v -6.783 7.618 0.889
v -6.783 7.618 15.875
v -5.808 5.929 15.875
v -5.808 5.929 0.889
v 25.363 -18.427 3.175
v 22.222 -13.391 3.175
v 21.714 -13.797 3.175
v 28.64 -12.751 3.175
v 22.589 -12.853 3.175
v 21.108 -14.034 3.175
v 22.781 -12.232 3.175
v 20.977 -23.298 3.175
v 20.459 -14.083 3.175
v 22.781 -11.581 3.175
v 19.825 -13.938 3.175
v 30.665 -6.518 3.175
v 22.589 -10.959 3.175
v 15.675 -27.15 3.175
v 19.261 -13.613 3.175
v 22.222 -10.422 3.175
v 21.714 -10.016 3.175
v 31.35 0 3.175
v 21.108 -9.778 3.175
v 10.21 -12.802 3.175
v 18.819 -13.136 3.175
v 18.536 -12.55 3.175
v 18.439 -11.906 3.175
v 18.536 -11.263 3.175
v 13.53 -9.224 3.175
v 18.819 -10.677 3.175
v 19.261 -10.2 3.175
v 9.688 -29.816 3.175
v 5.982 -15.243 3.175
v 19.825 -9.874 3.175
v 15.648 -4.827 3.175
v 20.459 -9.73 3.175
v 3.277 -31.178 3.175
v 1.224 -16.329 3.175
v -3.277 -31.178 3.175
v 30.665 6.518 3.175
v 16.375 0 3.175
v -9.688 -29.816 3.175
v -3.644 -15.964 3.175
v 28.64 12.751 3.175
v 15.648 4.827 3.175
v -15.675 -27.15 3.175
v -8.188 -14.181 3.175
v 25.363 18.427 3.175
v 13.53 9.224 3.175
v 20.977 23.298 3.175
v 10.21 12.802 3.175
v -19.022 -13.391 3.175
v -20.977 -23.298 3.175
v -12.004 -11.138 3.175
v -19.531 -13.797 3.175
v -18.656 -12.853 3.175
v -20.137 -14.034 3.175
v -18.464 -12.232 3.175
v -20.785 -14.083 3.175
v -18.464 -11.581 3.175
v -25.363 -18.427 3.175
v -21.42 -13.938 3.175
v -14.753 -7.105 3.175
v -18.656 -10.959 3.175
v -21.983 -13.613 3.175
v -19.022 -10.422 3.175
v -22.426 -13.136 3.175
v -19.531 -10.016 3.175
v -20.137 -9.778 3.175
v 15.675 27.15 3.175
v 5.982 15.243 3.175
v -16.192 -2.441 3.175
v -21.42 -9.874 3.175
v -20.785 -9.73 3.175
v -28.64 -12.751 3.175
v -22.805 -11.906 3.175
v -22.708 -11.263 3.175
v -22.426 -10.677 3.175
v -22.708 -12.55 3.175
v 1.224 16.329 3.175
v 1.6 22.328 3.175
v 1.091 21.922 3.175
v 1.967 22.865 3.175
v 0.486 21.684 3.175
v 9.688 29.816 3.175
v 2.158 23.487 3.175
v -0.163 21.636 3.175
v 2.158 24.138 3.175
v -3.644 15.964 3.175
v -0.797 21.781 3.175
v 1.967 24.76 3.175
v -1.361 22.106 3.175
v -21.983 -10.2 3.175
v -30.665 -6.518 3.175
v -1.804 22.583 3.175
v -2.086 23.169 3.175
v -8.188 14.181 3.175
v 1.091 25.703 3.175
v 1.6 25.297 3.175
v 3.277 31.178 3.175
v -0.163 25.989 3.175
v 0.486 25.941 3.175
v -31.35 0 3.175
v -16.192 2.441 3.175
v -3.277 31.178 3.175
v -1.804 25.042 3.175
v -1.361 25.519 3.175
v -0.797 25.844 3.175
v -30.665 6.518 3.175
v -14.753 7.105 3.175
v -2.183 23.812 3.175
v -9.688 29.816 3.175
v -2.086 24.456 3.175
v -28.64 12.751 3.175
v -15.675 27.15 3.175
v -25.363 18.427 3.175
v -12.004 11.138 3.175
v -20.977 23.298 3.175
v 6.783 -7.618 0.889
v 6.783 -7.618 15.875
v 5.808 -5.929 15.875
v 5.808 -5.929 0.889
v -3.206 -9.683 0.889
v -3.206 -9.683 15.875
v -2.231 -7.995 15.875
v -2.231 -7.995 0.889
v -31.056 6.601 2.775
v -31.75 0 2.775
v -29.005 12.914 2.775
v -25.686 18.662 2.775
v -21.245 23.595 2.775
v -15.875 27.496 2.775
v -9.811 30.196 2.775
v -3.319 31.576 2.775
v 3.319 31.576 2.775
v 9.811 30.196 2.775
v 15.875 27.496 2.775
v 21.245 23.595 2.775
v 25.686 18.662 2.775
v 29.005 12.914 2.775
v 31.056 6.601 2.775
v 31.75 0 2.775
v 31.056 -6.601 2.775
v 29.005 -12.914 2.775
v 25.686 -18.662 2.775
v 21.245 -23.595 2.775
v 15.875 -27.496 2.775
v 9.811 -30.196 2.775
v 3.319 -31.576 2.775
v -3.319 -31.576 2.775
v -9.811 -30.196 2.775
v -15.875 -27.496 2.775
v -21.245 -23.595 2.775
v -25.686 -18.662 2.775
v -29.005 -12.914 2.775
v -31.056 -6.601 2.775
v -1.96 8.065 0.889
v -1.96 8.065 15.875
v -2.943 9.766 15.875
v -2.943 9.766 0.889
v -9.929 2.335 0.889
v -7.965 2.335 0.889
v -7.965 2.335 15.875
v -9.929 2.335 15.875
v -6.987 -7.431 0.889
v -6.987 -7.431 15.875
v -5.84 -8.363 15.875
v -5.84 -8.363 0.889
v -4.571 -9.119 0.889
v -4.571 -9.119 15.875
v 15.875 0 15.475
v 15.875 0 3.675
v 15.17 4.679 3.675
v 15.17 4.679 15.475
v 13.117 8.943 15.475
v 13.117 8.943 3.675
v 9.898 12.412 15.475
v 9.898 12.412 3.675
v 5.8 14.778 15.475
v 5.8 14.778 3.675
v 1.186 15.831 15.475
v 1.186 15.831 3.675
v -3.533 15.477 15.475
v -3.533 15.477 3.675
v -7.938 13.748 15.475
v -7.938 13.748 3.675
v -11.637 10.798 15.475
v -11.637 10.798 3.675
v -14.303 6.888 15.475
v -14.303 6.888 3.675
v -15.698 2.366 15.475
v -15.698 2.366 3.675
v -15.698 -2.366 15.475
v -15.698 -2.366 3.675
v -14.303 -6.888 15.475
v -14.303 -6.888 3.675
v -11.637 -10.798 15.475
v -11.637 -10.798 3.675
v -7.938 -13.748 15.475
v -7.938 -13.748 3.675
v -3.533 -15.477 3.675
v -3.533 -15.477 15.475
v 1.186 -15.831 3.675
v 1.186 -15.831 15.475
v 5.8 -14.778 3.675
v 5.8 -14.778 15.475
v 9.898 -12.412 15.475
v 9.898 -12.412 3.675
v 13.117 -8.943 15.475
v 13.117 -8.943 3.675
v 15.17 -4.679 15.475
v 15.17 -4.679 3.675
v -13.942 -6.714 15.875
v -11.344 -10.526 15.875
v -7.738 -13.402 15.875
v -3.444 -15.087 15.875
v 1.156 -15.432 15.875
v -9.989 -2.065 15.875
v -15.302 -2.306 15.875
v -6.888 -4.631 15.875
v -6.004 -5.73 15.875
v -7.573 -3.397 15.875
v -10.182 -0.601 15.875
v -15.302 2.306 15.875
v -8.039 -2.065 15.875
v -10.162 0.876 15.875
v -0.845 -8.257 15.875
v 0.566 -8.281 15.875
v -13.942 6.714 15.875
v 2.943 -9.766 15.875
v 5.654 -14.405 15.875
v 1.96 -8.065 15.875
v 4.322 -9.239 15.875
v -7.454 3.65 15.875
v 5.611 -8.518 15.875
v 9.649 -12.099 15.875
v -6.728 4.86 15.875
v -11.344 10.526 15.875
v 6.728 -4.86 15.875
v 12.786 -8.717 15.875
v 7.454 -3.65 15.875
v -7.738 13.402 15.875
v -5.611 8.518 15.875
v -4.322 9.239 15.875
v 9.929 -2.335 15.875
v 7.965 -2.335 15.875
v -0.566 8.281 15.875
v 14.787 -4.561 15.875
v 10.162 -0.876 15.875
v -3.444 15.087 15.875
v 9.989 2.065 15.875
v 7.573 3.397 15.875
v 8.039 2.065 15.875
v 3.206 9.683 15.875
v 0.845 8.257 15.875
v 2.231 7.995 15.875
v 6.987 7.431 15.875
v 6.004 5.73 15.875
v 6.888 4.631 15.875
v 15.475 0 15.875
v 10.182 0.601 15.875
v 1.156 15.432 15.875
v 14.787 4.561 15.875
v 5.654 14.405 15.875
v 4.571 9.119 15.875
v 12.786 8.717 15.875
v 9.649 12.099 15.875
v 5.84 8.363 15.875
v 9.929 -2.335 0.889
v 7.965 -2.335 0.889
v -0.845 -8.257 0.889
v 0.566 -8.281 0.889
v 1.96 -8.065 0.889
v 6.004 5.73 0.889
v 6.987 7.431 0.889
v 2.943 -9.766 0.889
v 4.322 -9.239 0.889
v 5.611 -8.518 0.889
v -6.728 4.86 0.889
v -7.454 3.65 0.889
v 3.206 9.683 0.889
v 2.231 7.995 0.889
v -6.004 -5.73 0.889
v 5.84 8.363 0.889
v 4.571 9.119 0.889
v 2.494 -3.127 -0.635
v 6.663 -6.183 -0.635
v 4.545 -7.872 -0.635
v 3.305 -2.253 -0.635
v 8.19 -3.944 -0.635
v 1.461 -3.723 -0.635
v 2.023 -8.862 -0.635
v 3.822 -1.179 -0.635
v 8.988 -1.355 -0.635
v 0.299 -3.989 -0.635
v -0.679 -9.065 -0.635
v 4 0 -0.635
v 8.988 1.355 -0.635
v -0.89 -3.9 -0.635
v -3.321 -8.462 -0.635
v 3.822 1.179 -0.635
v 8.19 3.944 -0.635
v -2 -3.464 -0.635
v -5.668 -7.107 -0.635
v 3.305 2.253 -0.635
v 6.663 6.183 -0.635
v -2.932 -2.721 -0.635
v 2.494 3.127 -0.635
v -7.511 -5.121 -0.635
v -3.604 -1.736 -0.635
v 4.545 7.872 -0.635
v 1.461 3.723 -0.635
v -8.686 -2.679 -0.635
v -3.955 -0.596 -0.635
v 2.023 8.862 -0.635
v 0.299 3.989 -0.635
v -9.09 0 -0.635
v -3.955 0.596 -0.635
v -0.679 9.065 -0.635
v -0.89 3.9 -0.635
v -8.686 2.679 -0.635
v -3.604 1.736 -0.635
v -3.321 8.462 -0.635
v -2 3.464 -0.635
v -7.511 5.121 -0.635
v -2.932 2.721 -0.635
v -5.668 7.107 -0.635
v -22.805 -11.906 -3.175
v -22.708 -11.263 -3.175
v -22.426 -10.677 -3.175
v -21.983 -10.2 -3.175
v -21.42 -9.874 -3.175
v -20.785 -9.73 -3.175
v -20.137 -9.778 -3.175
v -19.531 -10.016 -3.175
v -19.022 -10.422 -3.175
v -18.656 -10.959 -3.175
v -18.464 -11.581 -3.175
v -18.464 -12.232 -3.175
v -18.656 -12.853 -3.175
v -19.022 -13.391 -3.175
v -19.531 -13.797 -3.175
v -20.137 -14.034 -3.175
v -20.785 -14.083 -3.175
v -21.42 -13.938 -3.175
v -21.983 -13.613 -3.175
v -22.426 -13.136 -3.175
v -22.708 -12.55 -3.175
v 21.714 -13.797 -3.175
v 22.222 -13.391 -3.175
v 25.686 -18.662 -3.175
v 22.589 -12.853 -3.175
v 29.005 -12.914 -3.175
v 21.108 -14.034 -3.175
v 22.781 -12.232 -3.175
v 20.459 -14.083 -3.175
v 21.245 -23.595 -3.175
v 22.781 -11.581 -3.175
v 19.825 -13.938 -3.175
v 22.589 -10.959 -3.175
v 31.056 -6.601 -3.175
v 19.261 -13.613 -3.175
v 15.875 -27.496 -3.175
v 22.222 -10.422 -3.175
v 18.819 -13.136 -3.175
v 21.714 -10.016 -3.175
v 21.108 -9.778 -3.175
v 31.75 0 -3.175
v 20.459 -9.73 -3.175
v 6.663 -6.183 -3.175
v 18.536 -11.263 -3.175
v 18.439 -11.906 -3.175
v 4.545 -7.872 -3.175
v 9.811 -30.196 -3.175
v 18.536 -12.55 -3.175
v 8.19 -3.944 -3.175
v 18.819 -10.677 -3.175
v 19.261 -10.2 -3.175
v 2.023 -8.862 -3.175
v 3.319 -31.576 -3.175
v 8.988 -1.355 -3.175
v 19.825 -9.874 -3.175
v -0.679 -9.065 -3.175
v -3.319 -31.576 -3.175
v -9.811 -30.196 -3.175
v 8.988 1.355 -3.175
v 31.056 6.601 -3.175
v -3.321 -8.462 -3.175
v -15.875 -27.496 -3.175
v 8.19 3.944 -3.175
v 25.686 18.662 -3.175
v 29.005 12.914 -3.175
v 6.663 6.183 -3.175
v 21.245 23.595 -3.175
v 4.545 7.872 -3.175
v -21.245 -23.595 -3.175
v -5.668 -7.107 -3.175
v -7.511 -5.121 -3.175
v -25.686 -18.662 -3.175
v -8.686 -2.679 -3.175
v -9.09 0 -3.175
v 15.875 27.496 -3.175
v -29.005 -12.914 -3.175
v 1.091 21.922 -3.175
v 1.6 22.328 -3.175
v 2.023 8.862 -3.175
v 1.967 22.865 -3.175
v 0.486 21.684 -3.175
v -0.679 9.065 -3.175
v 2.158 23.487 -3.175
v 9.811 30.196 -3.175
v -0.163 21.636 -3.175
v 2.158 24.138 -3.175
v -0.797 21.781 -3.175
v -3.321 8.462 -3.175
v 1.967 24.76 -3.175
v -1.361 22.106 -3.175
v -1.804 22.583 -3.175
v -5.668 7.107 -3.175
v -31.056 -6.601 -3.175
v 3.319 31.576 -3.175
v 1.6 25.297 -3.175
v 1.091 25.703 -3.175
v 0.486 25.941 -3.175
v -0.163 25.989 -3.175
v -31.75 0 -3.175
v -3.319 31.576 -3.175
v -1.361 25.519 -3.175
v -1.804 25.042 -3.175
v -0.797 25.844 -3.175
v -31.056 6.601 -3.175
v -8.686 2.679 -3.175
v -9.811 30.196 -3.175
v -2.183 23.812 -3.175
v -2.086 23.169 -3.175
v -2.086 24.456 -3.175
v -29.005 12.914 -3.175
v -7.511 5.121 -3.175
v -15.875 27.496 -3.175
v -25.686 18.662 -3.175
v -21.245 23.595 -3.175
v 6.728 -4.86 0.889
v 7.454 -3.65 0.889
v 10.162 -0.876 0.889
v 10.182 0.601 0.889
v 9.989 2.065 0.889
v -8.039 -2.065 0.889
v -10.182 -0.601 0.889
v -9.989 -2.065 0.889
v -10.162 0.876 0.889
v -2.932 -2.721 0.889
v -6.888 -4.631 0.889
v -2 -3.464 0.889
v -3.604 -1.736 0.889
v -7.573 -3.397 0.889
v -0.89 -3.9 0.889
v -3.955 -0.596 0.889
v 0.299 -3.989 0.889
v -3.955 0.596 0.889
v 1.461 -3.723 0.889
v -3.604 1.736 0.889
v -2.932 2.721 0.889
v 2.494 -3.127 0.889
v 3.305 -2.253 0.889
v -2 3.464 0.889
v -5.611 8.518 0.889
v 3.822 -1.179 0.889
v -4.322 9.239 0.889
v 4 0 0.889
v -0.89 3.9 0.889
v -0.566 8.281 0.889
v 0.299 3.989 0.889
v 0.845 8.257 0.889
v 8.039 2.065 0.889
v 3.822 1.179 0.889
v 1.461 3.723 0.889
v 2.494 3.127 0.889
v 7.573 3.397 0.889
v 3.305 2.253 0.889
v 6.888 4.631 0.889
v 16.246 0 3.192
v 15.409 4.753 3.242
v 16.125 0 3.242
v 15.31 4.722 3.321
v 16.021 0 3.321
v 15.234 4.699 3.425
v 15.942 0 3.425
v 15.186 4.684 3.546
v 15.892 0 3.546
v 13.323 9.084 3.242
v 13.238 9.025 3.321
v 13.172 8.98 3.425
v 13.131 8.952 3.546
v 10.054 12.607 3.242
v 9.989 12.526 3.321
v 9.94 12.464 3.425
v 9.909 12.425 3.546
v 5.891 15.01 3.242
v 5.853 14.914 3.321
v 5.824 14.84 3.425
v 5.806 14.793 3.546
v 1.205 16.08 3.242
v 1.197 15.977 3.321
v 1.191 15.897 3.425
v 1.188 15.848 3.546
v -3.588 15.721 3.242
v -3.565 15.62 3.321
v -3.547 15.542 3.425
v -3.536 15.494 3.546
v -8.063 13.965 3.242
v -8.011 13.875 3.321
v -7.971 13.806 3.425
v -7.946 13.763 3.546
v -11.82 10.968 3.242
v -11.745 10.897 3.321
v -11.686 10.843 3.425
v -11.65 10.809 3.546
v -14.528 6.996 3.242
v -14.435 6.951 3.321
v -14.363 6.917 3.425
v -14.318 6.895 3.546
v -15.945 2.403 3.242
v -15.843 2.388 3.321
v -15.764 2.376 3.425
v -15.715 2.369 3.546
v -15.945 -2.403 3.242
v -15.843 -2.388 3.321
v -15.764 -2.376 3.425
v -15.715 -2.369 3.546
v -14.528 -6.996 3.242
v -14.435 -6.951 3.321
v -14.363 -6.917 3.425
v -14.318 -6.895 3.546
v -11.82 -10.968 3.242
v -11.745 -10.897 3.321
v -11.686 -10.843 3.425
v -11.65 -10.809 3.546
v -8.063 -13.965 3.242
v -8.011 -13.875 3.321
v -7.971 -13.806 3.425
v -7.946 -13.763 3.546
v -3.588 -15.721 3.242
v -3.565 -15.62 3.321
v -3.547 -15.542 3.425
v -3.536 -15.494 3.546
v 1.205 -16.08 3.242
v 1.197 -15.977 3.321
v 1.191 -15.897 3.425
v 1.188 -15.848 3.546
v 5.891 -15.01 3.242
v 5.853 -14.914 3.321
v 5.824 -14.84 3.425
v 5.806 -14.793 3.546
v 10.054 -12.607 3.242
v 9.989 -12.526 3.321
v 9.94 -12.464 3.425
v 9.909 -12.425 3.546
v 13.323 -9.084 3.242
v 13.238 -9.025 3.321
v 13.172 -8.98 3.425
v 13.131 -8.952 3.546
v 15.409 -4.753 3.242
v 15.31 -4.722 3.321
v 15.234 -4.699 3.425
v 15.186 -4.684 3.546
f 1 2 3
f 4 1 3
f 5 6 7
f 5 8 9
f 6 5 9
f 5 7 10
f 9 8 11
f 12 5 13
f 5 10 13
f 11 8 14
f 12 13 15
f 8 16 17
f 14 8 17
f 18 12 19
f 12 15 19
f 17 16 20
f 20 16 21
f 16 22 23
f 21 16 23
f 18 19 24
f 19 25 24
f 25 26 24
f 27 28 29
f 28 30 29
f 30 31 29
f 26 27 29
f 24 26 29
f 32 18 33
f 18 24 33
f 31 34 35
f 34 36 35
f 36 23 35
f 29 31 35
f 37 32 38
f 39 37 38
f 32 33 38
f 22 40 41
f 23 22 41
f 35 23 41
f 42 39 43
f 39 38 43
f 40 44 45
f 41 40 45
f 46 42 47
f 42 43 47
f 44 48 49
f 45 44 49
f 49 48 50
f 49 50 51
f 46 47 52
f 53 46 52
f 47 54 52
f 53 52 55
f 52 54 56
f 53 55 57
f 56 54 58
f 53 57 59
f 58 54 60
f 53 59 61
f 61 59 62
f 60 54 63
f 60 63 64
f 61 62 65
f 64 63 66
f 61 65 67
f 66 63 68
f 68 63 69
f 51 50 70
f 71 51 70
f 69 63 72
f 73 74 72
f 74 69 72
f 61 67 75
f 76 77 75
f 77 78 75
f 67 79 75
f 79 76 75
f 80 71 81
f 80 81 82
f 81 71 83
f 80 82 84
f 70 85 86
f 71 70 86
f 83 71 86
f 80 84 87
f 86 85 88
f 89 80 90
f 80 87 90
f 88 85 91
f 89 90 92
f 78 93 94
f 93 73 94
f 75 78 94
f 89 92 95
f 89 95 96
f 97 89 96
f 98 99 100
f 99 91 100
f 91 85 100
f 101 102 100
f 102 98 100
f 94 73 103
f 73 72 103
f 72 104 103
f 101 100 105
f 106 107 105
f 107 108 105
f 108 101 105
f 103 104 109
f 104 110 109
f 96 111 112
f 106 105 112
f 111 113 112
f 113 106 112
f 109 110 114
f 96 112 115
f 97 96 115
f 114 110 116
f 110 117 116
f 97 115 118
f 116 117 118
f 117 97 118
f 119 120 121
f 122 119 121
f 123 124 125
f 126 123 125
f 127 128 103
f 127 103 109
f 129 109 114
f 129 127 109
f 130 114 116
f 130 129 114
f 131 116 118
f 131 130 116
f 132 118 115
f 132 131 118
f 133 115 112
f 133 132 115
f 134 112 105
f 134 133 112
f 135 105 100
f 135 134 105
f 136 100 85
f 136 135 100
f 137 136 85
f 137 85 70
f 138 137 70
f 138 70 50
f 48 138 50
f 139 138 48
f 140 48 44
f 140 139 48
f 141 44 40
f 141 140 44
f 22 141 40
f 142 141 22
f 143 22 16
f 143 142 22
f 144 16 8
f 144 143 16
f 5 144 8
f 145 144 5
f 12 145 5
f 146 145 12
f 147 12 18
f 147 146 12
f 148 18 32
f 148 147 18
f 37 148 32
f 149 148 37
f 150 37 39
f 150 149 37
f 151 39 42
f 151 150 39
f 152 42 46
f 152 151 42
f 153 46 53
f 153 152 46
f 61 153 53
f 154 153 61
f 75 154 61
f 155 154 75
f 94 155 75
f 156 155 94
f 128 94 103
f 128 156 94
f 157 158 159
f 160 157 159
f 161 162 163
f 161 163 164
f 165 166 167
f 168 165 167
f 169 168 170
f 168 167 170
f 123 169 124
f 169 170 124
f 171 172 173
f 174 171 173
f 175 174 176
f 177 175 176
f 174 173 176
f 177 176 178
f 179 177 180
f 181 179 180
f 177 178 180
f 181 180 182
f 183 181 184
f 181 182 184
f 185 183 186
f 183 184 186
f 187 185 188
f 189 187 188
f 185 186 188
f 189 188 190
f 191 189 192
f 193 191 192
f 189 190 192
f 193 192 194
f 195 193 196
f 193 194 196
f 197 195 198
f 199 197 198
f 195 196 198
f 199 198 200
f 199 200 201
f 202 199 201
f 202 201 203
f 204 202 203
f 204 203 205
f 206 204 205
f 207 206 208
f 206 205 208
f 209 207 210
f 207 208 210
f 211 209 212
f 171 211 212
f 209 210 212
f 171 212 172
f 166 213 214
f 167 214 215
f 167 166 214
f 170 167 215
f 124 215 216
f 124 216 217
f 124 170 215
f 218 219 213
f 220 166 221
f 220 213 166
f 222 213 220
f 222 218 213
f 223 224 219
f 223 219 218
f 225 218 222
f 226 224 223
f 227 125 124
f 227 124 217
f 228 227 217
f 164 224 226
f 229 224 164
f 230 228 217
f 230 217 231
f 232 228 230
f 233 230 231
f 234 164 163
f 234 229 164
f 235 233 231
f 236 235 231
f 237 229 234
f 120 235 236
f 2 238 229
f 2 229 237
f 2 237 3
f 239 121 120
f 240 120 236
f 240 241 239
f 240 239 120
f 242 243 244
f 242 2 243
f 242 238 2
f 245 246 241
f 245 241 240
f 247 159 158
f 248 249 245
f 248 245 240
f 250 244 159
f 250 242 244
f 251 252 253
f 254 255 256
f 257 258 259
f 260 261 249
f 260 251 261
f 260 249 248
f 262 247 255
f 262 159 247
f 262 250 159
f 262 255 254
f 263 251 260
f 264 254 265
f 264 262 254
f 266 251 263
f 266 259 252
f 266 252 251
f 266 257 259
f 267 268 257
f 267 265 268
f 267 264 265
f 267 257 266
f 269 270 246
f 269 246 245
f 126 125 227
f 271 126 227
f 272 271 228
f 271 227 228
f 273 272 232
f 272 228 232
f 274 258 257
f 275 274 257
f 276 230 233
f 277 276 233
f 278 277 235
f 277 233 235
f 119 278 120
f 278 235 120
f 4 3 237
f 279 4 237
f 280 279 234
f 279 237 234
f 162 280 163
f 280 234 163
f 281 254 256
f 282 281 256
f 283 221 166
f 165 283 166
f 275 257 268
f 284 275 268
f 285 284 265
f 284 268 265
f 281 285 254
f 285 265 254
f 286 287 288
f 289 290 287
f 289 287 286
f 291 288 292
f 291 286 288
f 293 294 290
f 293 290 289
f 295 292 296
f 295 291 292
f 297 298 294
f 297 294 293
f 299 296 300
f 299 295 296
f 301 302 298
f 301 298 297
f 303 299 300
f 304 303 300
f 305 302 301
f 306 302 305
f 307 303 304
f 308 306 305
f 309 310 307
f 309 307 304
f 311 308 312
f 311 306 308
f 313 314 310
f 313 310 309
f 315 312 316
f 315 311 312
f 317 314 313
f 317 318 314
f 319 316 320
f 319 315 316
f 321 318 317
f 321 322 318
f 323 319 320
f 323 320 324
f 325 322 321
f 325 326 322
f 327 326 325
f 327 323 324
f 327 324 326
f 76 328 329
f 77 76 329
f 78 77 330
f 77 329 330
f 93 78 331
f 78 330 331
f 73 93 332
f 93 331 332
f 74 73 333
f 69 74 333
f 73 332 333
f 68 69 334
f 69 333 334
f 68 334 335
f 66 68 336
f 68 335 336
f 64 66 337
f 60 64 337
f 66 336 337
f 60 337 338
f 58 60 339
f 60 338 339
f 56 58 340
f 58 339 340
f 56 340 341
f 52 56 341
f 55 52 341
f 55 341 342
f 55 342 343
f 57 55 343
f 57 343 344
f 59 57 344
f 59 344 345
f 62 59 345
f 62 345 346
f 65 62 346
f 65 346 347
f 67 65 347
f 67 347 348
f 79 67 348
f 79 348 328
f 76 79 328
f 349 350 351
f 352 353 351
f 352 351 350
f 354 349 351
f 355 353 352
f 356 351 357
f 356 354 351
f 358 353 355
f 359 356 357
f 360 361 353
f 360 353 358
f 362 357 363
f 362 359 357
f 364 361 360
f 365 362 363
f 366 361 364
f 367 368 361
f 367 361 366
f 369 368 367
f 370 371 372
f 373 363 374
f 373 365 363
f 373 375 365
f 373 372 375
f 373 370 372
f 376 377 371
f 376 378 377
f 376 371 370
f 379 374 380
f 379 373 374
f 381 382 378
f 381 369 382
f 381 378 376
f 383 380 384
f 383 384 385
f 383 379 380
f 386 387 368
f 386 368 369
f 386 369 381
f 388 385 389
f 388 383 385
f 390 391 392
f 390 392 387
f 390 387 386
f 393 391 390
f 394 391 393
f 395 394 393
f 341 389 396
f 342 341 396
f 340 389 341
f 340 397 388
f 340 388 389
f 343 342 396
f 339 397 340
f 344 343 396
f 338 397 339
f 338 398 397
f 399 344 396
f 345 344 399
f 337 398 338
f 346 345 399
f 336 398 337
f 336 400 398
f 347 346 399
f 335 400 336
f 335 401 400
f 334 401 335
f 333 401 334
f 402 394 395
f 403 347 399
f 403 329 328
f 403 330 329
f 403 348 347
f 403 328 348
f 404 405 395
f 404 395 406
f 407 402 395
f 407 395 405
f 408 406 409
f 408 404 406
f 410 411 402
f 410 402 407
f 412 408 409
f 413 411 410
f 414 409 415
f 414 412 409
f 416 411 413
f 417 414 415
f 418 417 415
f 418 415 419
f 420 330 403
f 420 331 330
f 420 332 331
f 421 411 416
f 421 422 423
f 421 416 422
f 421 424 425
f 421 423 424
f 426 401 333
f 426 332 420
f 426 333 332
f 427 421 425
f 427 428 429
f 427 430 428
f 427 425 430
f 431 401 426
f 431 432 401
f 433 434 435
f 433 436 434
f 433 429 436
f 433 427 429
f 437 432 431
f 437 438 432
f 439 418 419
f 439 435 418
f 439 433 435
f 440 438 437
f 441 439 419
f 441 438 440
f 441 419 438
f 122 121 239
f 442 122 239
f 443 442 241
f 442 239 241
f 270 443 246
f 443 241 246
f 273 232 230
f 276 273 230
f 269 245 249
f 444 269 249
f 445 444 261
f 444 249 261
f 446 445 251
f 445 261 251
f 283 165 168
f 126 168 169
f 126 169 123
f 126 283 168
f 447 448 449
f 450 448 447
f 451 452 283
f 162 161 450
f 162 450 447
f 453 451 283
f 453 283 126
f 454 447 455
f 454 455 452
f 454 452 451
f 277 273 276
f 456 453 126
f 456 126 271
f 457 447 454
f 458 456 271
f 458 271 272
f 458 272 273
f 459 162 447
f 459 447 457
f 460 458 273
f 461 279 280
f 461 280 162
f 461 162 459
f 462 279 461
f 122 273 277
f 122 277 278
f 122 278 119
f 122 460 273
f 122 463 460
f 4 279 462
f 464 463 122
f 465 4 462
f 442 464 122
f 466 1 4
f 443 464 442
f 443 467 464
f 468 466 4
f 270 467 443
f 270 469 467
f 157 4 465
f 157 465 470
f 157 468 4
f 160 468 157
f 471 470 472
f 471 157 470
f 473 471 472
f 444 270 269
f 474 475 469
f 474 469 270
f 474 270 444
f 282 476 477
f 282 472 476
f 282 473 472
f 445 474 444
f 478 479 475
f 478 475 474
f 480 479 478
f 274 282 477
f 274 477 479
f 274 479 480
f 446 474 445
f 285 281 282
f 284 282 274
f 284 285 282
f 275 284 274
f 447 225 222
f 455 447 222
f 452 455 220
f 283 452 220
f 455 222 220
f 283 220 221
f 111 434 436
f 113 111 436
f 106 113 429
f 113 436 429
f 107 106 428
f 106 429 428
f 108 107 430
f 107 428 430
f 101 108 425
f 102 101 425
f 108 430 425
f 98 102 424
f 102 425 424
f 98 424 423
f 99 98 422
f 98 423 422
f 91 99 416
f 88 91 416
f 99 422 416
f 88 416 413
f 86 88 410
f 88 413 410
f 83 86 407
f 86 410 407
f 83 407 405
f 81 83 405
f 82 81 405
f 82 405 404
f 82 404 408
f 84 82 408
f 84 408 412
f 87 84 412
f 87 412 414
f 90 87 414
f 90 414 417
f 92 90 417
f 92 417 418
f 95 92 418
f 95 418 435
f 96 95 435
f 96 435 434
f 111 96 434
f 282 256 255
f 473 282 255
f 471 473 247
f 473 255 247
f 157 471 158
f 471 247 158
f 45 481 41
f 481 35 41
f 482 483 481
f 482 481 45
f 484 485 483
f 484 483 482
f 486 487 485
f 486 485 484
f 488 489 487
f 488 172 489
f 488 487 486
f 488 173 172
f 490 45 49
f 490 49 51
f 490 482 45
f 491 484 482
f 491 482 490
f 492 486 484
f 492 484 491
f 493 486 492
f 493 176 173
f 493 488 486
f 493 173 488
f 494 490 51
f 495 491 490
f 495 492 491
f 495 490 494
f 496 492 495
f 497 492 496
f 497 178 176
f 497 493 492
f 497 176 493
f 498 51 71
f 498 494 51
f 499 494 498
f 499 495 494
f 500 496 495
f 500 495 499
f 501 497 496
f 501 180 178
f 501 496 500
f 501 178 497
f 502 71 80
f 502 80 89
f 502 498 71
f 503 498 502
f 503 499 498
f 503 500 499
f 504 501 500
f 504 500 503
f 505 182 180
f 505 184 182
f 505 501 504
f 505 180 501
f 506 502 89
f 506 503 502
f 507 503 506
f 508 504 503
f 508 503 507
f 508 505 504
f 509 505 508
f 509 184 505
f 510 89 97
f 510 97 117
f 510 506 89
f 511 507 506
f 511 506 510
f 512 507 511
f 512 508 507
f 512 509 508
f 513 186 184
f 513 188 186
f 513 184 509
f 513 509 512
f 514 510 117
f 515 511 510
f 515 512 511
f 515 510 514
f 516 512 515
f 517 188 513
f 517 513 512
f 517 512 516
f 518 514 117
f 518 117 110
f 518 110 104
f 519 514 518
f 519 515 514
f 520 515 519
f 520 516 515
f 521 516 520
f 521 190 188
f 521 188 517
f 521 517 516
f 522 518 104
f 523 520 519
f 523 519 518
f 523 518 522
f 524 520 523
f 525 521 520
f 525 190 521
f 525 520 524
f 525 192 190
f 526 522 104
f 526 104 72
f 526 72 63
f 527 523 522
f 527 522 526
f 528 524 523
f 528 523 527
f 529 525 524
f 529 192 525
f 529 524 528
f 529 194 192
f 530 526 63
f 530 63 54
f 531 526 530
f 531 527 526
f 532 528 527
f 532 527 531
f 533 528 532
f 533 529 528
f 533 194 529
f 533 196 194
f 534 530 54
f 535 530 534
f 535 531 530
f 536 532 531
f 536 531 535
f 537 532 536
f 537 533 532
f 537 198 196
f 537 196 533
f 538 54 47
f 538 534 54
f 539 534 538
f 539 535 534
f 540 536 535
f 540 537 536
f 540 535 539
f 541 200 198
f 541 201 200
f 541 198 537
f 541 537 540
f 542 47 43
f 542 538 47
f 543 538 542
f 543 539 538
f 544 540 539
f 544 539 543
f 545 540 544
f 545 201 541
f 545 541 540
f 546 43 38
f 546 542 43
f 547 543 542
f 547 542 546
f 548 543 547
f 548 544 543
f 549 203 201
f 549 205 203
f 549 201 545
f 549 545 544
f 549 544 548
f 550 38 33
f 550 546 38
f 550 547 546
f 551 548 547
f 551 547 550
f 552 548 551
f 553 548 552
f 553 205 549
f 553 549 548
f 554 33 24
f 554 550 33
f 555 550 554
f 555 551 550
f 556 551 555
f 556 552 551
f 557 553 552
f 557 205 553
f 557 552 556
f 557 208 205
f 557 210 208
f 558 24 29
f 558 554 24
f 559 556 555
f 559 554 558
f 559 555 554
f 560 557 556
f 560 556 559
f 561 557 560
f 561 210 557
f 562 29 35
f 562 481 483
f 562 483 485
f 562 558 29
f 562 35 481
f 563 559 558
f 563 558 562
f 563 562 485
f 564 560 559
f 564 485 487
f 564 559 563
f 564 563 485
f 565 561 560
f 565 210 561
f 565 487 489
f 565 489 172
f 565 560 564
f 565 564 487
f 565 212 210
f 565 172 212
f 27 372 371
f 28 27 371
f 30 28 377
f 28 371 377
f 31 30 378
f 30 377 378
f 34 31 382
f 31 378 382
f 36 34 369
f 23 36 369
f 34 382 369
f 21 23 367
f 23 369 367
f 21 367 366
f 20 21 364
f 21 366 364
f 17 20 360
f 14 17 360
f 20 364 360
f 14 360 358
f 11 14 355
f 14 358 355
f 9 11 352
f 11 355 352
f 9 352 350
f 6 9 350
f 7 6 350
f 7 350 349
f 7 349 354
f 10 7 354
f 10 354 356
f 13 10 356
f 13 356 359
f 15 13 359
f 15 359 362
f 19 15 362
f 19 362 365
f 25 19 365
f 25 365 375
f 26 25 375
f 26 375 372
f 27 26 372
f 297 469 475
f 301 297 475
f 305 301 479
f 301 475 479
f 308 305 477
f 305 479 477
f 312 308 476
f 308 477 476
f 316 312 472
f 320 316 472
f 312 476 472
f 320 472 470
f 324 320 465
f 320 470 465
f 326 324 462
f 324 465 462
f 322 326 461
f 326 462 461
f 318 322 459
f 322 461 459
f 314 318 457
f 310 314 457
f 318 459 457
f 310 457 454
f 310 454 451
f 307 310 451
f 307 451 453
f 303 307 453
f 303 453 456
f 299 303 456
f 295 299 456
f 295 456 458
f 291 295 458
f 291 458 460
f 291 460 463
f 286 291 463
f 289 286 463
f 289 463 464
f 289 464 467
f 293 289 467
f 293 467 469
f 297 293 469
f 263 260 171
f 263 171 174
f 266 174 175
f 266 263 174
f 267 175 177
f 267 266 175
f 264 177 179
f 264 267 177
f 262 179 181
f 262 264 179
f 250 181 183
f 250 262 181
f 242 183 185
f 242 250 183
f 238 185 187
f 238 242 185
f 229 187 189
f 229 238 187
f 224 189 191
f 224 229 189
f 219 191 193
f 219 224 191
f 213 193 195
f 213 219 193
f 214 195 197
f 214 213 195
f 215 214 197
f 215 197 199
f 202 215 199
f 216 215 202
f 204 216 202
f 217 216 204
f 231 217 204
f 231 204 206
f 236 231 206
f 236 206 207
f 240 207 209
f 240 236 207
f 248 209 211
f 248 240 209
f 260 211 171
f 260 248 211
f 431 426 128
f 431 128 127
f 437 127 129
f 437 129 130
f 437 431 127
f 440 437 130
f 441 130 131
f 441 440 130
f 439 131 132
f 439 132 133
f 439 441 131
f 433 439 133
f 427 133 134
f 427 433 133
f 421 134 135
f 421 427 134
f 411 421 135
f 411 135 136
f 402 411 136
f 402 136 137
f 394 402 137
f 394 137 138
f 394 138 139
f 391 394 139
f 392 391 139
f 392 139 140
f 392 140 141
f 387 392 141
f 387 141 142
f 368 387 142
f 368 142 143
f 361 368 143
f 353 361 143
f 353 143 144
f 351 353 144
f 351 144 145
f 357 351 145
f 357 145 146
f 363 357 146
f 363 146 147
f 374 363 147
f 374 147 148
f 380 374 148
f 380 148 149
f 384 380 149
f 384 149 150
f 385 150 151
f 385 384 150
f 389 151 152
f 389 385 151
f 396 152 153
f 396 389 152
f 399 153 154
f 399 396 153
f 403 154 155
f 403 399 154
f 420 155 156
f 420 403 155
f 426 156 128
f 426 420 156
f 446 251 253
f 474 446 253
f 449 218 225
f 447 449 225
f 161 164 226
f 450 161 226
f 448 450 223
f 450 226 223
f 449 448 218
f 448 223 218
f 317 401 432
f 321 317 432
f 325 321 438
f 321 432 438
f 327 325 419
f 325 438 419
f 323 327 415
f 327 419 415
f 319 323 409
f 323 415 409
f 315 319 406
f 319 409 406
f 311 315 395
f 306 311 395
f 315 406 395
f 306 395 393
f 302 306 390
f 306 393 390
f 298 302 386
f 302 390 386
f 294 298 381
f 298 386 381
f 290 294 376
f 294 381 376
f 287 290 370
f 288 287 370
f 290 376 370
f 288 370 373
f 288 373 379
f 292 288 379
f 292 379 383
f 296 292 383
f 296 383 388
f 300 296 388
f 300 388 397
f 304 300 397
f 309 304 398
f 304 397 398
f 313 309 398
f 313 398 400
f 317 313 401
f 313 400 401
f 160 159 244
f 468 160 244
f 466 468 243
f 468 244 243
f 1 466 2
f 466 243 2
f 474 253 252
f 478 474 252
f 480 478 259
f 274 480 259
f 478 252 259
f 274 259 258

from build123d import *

# Parameters (mm, degrees)
SKETCH1_W           = 38.1
SKETCH1_H           = 6.35
SKETCH2_R           = 15.875
BOSS_EXTRUDE1_DEPTH = 12.7
CUT_EXTRUDE1_DEPTH  = 14.986
SKETCH10_R          = 4
CUT_EXTRUDE3_DEPTH  = 10
FILLET2_R           = 0.5
SKETCH12_R          = 38.1
SKETCH12_R_2        = 31.75
SKETCH12_R_3        = 2.1828
CUT_EXTRUDE8_DEPTH  = 10
CHAMFER1_SIZE       = 0.4
SKETCH13_R          = 9.09
CUT_EXTRUDE9_DEPTH  = 2.54
CUT_EXTRUDE10_DEPTH = 14.986


with BuildPart() as part:
    # Sketch1 → Revolve1 (revolve)
    with BuildSketch(Plane(origin=(0, 0, 0), x_dir=(1, 0, 0), z_dir=(0, 1, 0))):
        with Locations((19.05, 0)):
            Rectangle(SKETCH1_W, SKETCH1_H)
    revolve(axis=Axis((0, 0, -3.175), (0, 0, 1)))

    # Sketch2 → Boss-Extrude1 (add)
    with BuildSketch(Plane.XY.offset(3.175)):
        Circle(SKETCH2_R)
    extrude(amount=BOSS_EXTRUDE1_DEPTH)

    # Sketch3 → Cut-Extrude1 (cut)
    with BuildSketch(Plane.XY.offset(15.875)):
        with BuildLine():
            Line((-7.813605563, 2.134846154), (-9.769464259, 2.134846154))
            ThreePointArc((-9.769464259, 2.134846154), (-9.999052891, 0.137627323), (-9.824520402, -1.865153846))
            Line((-9.824520402, -1.865153846), (-7.882334751, -1.865153846))
            ThreePointArc((-7.882334751, -1.865153846), (-7.083348537, -3.928889601), (-5.755633784, -5.699357836))
            Line((-5.755633784, -5.699357836), (-6.733563132, -7.393181152))
            ThreePointArc((-6.733563132, -7.393181152), (-5.118715203, -8.590620156), (-3.296989588, -9.440861171))
            Line((-3.296989588, -9.440861171), (-2.325896763, -7.758879059))
            ThreePointArc((-2.325896763, -7.758879059), (-0.139156065, -8.098804578), (2.057971779, -7.83420399))
            Line((2.057971779, -7.83420399), (3.035901127, -9.528027306))
            ThreePointArc((3.035901127, -9.528027306), (4.880337688, -8.728247479), (6.527530814, -7.575707325))
            Line((6.527530814, -7.575707325), (5.556437988, -5.893725213))
            ThreePointArc((5.556437988, -5.893725213), (6.944192472, -4.169914977), (7.813605563, -2.134846154))
            Line((7.813605563, -2.134846154), (9.769464259, -2.134846154))
            ThreePointArc((9.769464259, -2.134846154), (9.999052891, -0.137627323), (9.824520402, 1.865153846))
            Line((9.824520402, 1.865153846), (7.882334751, 1.865153846))
            ThreePointArc((7.882334751, 1.865153846), (7.083348537, 3.928889601), (5.755633784, 5.699357836))
            Line((5.755633784, 5.699357836), (6.733563132, 7.393181152))
            ThreePointArc((6.733563132, 7.393181152), (5.118715203, 8.590620156), (3.296989588, 9.440861171))
            Line((3.296989588, 9.440861171), (2.325896763, 7.758879059))
            ThreePointArc((2.325896763, 7.758879059), (0.139156065, 8.098804578), (-2.057971779, 7.83420399))
            Line((-2.057971779, 7.83420399), (-3.035901127, 9.528027306))
            ThreePointArc((-3.035901127, 9.528027306), (-4.880337688, 8.728247479), (-6.527530814, 7.575707325))
            Line((-6.527530814, 7.575707325), (-5.556437988, 5.893725213))
            ThreePointArc((-5.556437988, 5.893725213), (-6.944192472, 4.169914977), (-7.813605563, 2.134846154))
        make_face()
    extrude(amount=-CUT_EXTRUDE1_DEPTH, mode=Mode.SUBTRACT)

    # Sketch10 → Cut-Extrude3 (cut)
    with BuildSketch(Plane.XY.offset(0.889)):
        Circle(SKETCH10_R)
    extrude(amount=-CUT_EXTRUDE3_DEPTH, mode=Mode.SUBTRACT)

    # Fillet2
    fillet2_edges = [part.edges().sort_by_distance(p)[0] for p in [
        (-15.875, 0, 3.175),
    ]]
    fillet(fillet2_edges, radius=FILLET2_R)

    # Sketch12 → Cut-Extrude8 (cut)
    # profile 1 of 4: a face of its own
    with BuildSketch(Plane(origin=(0, 0, -3.175), x_dir=(-1, 0, 0), z_dir=(0, 0, -1))):
        Circle(SKETCH12_R)
        Circle(SKETCH12_R_2, mode=Mode.SUBTRACT)
    # profile 2 of 4: a face of its own
    with BuildSketch(Plane(origin=(0, 0, -3.175), x_dir=(-1, 0, 0), z_dir=(0, 0, -1))):
        with Locations((0, 23.8125)):
            Circle(SKETCH12_R_3)
    # profile 3 of 4: a face of its own
    with BuildSketch(Plane(origin=(0, 0, -3.175), x_dir=(-1, 0, 0), z_dir=(0, 0, -1))):
        with Locations((-20.622229928, -11.90625)):
            Circle(SKETCH12_R_3)
    # profile 4 of 4: a face of its own
    with BuildSketch(Plane(origin=(0, 0, -3.175), x_dir=(-1, 0, 0), z_dir=(0, 0, -1))):
        with Locations((20.622229928, -11.90625)):
            Circle(SKETCH12_R_3)
    extrude(amount=-CUT_EXTRUDE8_DEPTH, mode=Mode.SUBTRACT)

    # Chamfer1
    chamfer1_edges = [part.edges().sort_by_distance(p)[0] for p in [
        (31.75, 0, 3.175),
        (-15.875, 0, 15.875),
    ]]
    chamfer(chamfer1_edges, length=CHAMFER1_SIZE)

    # Sketch13 → Cut-Extrude9 (cut)
    with BuildSketch(Plane(origin=(0, 0, -3.175), x_dir=(-1, 0, 0), z_dir=(0, 0, -1))):
        Circle(SKETCH13_R)
    extrude(amount=-CUT_EXTRUDE9_DEPTH, mode=Mode.SUBTRACT)

    # Sketch11 → Cut-Extrude10 (cut)
    with BuildSketch(Plane.XY.offset(15.875)):
        with BuildLine():
            Line((-6.78285102, 7.617934894), (-5.807963832, 5.929380754))
            ThreePointArc((-5.807963832, 5.929380754), (-7.117065553, 4.270524315), (-7.964828525, 2.334846154))
            Line((-7.964828525, 2.334846154), (-9.929173855, 2.334846154))
            ThreePointArc((-9.929173855, 2.334846154), (-10.199065112, 0.13809719), (-9.988750652, -2.065153846))
            Line((-9.988750652, -2.065153846), (-8.038976278, -2.065153846))
            ThreePointArc((-8.038976278, -2.065153846), (-7.25691532, -4.028297412), (-6.004450346, -5.730320763))
            Line((-6.004450346, -5.730320763), (-6.986623011, -7.43149372))
            ThreePointArc((-6.986623011, -7.43149372), (-5.219128231, -8.763600887), (-3.205899633, -9.68308874))
            Line((-3.205899633, -9.68308874), (-2.231012445, -7.9945346))
            ThreePointArc((-2.231012445, -7.9945346), (-0.139849768, -8.298821726), (1.96037818, -8.065166917))
            Line((1.96037818, -8.065166917), (2.942550844, -9.766339874))
            ThreePointArc((2.942550844, -9.766339874), (4.979936881, -8.901698077), (6.78285102, -7.617934894))
            Line((6.78285102, -7.617934894), (5.807963832, -5.929380754))
            ThreePointArc((5.807963832, -5.929380754), (7.117065553, -4.270524315), (7.964828525, -2.334846154))
            Line((7.964828525, -2.334846154), (9.929173855, -2.334846154))
            ThreePointArc((9.929173855, -2.334846154), (10.199065112, -0.13809719), (9.988750652, 2.065153846))
            Line((9.988750652, 2.065153846), (8.038976278, 2.065153846))
            ThreePointArc((8.038976278, 2.065153846), (7.25691532, 4.028297412), (6.004450346, 5.730320763))
            Line((6.004450346, 5.730320763), (6.986623011, 7.43149372))
            ThreePointArc((6.986623011, 7.43149372), (5.219128231, 8.763600887), (3.205899633, 9.68308874))
            Line((3.205899633, 9.68308874), (2.231012445, 7.9945346))
            ThreePointArc((2.231012445, 7.9945346), (0.139849768, 8.298821726), (-1.96037818, 8.065166917))
            Line((-1.96037818, 8.065166917), (-2.942550844, 9.766339874))
            ThreePointArc((-2.942550844, 9.766339874), (-4.979936881, 8.901698077), (-6.78285102, 7.617934894))
        make_face()
        with BuildLine():
            Line((-9.769464259, 2.134846154), (-7.813605563, 2.134846154))
            ThreePointArc((-7.813605563, 2.134846154), (-6.944192472, 4.169914977), (-5.556437988, 5.893725213))
            Line((-5.556437988, 5.893725213), (-6.527530814, 7.575707325))
            ThreePointArc((-6.527530814, 7.575707325), (-4.880337688, 8.728247479), (-3.035901127, 9.528027306))
            Line((-3.035901127, 9.528027306), (-2.057971779, 7.83420399))
            ThreePointArc((-2.057971779, 7.83420399), (0.139156065, 8.098804578), (2.325896763, 7.758879059))
            Line((2.325896763, 7.758879059), (3.296989588, 9.440861171))
            ThreePointArc((3.296989588, 9.440861171), (5.118715203, 8.590620156), (6.733563132, 7.393181152))
            Line((6.733563132, 7.393181152), (5.755633784, 5.699357836))
            ThreePointArc((5.755633784, 5.699357836), (7.083348537, 3.928889601), (7.882334751, 1.865153846))
            Line((7.882334751, 1.865153846), (9.824520402, 1.865153846))
            ThreePointArc((9.824520402, 1.865153846), (9.999052891, -0.137627323), (9.769464259, -2.134846154))
            Line((9.769464259, -2.134846154), (7.813605563, -2.134846154))
            ThreePointArc((7.813605563, -2.134846154), (6.944192472, -4.169914977), (5.556437988, -5.893725213))
            Line((5.556437988, -5.893725213), (6.527530814, -7.575707325))
            ThreePointArc((6.527530814, -7.575707325), (4.880337688, -8.728247479), (3.035901127, -9.528027306))
            Line((3.035901127, -9.528027306), (2.057971779, -7.83420399))
            ThreePointArc((2.057971779, -7.83420399), (-0.139156065, -8.098804578), (-2.325896763, -7.758879059))
            Line((-2.325896763, -7.758879059), (-3.296989588, -9.440861171))
            ThreePointArc((-3.296989588, -9.440861171), (-5.118715203, -8.590620156), (-6.733563132, -7.393181152))
            Line((-6.733563132, -7.393181152), (-5.755633784, -5.699357836))
            ThreePointArc((-5.755633784, -5.699357836), (-7.083348537, -3.928889601), (-7.882334751, -1.865153846))
            Line((-7.882334751, -1.865153846), (-9.824520402, -1.865153846))
            ThreePointArc((-9.824520402, -1.865153846), (-9.999052891, 0.137627323), (-9.769464259, 2.134846154))
        make_face(mode=Mode.SUBTRACT)
    extrude(amount=-CUT_EXTRUDE10_DEPTH, mode=Mode.SUBTRACT)


solid = part.part
